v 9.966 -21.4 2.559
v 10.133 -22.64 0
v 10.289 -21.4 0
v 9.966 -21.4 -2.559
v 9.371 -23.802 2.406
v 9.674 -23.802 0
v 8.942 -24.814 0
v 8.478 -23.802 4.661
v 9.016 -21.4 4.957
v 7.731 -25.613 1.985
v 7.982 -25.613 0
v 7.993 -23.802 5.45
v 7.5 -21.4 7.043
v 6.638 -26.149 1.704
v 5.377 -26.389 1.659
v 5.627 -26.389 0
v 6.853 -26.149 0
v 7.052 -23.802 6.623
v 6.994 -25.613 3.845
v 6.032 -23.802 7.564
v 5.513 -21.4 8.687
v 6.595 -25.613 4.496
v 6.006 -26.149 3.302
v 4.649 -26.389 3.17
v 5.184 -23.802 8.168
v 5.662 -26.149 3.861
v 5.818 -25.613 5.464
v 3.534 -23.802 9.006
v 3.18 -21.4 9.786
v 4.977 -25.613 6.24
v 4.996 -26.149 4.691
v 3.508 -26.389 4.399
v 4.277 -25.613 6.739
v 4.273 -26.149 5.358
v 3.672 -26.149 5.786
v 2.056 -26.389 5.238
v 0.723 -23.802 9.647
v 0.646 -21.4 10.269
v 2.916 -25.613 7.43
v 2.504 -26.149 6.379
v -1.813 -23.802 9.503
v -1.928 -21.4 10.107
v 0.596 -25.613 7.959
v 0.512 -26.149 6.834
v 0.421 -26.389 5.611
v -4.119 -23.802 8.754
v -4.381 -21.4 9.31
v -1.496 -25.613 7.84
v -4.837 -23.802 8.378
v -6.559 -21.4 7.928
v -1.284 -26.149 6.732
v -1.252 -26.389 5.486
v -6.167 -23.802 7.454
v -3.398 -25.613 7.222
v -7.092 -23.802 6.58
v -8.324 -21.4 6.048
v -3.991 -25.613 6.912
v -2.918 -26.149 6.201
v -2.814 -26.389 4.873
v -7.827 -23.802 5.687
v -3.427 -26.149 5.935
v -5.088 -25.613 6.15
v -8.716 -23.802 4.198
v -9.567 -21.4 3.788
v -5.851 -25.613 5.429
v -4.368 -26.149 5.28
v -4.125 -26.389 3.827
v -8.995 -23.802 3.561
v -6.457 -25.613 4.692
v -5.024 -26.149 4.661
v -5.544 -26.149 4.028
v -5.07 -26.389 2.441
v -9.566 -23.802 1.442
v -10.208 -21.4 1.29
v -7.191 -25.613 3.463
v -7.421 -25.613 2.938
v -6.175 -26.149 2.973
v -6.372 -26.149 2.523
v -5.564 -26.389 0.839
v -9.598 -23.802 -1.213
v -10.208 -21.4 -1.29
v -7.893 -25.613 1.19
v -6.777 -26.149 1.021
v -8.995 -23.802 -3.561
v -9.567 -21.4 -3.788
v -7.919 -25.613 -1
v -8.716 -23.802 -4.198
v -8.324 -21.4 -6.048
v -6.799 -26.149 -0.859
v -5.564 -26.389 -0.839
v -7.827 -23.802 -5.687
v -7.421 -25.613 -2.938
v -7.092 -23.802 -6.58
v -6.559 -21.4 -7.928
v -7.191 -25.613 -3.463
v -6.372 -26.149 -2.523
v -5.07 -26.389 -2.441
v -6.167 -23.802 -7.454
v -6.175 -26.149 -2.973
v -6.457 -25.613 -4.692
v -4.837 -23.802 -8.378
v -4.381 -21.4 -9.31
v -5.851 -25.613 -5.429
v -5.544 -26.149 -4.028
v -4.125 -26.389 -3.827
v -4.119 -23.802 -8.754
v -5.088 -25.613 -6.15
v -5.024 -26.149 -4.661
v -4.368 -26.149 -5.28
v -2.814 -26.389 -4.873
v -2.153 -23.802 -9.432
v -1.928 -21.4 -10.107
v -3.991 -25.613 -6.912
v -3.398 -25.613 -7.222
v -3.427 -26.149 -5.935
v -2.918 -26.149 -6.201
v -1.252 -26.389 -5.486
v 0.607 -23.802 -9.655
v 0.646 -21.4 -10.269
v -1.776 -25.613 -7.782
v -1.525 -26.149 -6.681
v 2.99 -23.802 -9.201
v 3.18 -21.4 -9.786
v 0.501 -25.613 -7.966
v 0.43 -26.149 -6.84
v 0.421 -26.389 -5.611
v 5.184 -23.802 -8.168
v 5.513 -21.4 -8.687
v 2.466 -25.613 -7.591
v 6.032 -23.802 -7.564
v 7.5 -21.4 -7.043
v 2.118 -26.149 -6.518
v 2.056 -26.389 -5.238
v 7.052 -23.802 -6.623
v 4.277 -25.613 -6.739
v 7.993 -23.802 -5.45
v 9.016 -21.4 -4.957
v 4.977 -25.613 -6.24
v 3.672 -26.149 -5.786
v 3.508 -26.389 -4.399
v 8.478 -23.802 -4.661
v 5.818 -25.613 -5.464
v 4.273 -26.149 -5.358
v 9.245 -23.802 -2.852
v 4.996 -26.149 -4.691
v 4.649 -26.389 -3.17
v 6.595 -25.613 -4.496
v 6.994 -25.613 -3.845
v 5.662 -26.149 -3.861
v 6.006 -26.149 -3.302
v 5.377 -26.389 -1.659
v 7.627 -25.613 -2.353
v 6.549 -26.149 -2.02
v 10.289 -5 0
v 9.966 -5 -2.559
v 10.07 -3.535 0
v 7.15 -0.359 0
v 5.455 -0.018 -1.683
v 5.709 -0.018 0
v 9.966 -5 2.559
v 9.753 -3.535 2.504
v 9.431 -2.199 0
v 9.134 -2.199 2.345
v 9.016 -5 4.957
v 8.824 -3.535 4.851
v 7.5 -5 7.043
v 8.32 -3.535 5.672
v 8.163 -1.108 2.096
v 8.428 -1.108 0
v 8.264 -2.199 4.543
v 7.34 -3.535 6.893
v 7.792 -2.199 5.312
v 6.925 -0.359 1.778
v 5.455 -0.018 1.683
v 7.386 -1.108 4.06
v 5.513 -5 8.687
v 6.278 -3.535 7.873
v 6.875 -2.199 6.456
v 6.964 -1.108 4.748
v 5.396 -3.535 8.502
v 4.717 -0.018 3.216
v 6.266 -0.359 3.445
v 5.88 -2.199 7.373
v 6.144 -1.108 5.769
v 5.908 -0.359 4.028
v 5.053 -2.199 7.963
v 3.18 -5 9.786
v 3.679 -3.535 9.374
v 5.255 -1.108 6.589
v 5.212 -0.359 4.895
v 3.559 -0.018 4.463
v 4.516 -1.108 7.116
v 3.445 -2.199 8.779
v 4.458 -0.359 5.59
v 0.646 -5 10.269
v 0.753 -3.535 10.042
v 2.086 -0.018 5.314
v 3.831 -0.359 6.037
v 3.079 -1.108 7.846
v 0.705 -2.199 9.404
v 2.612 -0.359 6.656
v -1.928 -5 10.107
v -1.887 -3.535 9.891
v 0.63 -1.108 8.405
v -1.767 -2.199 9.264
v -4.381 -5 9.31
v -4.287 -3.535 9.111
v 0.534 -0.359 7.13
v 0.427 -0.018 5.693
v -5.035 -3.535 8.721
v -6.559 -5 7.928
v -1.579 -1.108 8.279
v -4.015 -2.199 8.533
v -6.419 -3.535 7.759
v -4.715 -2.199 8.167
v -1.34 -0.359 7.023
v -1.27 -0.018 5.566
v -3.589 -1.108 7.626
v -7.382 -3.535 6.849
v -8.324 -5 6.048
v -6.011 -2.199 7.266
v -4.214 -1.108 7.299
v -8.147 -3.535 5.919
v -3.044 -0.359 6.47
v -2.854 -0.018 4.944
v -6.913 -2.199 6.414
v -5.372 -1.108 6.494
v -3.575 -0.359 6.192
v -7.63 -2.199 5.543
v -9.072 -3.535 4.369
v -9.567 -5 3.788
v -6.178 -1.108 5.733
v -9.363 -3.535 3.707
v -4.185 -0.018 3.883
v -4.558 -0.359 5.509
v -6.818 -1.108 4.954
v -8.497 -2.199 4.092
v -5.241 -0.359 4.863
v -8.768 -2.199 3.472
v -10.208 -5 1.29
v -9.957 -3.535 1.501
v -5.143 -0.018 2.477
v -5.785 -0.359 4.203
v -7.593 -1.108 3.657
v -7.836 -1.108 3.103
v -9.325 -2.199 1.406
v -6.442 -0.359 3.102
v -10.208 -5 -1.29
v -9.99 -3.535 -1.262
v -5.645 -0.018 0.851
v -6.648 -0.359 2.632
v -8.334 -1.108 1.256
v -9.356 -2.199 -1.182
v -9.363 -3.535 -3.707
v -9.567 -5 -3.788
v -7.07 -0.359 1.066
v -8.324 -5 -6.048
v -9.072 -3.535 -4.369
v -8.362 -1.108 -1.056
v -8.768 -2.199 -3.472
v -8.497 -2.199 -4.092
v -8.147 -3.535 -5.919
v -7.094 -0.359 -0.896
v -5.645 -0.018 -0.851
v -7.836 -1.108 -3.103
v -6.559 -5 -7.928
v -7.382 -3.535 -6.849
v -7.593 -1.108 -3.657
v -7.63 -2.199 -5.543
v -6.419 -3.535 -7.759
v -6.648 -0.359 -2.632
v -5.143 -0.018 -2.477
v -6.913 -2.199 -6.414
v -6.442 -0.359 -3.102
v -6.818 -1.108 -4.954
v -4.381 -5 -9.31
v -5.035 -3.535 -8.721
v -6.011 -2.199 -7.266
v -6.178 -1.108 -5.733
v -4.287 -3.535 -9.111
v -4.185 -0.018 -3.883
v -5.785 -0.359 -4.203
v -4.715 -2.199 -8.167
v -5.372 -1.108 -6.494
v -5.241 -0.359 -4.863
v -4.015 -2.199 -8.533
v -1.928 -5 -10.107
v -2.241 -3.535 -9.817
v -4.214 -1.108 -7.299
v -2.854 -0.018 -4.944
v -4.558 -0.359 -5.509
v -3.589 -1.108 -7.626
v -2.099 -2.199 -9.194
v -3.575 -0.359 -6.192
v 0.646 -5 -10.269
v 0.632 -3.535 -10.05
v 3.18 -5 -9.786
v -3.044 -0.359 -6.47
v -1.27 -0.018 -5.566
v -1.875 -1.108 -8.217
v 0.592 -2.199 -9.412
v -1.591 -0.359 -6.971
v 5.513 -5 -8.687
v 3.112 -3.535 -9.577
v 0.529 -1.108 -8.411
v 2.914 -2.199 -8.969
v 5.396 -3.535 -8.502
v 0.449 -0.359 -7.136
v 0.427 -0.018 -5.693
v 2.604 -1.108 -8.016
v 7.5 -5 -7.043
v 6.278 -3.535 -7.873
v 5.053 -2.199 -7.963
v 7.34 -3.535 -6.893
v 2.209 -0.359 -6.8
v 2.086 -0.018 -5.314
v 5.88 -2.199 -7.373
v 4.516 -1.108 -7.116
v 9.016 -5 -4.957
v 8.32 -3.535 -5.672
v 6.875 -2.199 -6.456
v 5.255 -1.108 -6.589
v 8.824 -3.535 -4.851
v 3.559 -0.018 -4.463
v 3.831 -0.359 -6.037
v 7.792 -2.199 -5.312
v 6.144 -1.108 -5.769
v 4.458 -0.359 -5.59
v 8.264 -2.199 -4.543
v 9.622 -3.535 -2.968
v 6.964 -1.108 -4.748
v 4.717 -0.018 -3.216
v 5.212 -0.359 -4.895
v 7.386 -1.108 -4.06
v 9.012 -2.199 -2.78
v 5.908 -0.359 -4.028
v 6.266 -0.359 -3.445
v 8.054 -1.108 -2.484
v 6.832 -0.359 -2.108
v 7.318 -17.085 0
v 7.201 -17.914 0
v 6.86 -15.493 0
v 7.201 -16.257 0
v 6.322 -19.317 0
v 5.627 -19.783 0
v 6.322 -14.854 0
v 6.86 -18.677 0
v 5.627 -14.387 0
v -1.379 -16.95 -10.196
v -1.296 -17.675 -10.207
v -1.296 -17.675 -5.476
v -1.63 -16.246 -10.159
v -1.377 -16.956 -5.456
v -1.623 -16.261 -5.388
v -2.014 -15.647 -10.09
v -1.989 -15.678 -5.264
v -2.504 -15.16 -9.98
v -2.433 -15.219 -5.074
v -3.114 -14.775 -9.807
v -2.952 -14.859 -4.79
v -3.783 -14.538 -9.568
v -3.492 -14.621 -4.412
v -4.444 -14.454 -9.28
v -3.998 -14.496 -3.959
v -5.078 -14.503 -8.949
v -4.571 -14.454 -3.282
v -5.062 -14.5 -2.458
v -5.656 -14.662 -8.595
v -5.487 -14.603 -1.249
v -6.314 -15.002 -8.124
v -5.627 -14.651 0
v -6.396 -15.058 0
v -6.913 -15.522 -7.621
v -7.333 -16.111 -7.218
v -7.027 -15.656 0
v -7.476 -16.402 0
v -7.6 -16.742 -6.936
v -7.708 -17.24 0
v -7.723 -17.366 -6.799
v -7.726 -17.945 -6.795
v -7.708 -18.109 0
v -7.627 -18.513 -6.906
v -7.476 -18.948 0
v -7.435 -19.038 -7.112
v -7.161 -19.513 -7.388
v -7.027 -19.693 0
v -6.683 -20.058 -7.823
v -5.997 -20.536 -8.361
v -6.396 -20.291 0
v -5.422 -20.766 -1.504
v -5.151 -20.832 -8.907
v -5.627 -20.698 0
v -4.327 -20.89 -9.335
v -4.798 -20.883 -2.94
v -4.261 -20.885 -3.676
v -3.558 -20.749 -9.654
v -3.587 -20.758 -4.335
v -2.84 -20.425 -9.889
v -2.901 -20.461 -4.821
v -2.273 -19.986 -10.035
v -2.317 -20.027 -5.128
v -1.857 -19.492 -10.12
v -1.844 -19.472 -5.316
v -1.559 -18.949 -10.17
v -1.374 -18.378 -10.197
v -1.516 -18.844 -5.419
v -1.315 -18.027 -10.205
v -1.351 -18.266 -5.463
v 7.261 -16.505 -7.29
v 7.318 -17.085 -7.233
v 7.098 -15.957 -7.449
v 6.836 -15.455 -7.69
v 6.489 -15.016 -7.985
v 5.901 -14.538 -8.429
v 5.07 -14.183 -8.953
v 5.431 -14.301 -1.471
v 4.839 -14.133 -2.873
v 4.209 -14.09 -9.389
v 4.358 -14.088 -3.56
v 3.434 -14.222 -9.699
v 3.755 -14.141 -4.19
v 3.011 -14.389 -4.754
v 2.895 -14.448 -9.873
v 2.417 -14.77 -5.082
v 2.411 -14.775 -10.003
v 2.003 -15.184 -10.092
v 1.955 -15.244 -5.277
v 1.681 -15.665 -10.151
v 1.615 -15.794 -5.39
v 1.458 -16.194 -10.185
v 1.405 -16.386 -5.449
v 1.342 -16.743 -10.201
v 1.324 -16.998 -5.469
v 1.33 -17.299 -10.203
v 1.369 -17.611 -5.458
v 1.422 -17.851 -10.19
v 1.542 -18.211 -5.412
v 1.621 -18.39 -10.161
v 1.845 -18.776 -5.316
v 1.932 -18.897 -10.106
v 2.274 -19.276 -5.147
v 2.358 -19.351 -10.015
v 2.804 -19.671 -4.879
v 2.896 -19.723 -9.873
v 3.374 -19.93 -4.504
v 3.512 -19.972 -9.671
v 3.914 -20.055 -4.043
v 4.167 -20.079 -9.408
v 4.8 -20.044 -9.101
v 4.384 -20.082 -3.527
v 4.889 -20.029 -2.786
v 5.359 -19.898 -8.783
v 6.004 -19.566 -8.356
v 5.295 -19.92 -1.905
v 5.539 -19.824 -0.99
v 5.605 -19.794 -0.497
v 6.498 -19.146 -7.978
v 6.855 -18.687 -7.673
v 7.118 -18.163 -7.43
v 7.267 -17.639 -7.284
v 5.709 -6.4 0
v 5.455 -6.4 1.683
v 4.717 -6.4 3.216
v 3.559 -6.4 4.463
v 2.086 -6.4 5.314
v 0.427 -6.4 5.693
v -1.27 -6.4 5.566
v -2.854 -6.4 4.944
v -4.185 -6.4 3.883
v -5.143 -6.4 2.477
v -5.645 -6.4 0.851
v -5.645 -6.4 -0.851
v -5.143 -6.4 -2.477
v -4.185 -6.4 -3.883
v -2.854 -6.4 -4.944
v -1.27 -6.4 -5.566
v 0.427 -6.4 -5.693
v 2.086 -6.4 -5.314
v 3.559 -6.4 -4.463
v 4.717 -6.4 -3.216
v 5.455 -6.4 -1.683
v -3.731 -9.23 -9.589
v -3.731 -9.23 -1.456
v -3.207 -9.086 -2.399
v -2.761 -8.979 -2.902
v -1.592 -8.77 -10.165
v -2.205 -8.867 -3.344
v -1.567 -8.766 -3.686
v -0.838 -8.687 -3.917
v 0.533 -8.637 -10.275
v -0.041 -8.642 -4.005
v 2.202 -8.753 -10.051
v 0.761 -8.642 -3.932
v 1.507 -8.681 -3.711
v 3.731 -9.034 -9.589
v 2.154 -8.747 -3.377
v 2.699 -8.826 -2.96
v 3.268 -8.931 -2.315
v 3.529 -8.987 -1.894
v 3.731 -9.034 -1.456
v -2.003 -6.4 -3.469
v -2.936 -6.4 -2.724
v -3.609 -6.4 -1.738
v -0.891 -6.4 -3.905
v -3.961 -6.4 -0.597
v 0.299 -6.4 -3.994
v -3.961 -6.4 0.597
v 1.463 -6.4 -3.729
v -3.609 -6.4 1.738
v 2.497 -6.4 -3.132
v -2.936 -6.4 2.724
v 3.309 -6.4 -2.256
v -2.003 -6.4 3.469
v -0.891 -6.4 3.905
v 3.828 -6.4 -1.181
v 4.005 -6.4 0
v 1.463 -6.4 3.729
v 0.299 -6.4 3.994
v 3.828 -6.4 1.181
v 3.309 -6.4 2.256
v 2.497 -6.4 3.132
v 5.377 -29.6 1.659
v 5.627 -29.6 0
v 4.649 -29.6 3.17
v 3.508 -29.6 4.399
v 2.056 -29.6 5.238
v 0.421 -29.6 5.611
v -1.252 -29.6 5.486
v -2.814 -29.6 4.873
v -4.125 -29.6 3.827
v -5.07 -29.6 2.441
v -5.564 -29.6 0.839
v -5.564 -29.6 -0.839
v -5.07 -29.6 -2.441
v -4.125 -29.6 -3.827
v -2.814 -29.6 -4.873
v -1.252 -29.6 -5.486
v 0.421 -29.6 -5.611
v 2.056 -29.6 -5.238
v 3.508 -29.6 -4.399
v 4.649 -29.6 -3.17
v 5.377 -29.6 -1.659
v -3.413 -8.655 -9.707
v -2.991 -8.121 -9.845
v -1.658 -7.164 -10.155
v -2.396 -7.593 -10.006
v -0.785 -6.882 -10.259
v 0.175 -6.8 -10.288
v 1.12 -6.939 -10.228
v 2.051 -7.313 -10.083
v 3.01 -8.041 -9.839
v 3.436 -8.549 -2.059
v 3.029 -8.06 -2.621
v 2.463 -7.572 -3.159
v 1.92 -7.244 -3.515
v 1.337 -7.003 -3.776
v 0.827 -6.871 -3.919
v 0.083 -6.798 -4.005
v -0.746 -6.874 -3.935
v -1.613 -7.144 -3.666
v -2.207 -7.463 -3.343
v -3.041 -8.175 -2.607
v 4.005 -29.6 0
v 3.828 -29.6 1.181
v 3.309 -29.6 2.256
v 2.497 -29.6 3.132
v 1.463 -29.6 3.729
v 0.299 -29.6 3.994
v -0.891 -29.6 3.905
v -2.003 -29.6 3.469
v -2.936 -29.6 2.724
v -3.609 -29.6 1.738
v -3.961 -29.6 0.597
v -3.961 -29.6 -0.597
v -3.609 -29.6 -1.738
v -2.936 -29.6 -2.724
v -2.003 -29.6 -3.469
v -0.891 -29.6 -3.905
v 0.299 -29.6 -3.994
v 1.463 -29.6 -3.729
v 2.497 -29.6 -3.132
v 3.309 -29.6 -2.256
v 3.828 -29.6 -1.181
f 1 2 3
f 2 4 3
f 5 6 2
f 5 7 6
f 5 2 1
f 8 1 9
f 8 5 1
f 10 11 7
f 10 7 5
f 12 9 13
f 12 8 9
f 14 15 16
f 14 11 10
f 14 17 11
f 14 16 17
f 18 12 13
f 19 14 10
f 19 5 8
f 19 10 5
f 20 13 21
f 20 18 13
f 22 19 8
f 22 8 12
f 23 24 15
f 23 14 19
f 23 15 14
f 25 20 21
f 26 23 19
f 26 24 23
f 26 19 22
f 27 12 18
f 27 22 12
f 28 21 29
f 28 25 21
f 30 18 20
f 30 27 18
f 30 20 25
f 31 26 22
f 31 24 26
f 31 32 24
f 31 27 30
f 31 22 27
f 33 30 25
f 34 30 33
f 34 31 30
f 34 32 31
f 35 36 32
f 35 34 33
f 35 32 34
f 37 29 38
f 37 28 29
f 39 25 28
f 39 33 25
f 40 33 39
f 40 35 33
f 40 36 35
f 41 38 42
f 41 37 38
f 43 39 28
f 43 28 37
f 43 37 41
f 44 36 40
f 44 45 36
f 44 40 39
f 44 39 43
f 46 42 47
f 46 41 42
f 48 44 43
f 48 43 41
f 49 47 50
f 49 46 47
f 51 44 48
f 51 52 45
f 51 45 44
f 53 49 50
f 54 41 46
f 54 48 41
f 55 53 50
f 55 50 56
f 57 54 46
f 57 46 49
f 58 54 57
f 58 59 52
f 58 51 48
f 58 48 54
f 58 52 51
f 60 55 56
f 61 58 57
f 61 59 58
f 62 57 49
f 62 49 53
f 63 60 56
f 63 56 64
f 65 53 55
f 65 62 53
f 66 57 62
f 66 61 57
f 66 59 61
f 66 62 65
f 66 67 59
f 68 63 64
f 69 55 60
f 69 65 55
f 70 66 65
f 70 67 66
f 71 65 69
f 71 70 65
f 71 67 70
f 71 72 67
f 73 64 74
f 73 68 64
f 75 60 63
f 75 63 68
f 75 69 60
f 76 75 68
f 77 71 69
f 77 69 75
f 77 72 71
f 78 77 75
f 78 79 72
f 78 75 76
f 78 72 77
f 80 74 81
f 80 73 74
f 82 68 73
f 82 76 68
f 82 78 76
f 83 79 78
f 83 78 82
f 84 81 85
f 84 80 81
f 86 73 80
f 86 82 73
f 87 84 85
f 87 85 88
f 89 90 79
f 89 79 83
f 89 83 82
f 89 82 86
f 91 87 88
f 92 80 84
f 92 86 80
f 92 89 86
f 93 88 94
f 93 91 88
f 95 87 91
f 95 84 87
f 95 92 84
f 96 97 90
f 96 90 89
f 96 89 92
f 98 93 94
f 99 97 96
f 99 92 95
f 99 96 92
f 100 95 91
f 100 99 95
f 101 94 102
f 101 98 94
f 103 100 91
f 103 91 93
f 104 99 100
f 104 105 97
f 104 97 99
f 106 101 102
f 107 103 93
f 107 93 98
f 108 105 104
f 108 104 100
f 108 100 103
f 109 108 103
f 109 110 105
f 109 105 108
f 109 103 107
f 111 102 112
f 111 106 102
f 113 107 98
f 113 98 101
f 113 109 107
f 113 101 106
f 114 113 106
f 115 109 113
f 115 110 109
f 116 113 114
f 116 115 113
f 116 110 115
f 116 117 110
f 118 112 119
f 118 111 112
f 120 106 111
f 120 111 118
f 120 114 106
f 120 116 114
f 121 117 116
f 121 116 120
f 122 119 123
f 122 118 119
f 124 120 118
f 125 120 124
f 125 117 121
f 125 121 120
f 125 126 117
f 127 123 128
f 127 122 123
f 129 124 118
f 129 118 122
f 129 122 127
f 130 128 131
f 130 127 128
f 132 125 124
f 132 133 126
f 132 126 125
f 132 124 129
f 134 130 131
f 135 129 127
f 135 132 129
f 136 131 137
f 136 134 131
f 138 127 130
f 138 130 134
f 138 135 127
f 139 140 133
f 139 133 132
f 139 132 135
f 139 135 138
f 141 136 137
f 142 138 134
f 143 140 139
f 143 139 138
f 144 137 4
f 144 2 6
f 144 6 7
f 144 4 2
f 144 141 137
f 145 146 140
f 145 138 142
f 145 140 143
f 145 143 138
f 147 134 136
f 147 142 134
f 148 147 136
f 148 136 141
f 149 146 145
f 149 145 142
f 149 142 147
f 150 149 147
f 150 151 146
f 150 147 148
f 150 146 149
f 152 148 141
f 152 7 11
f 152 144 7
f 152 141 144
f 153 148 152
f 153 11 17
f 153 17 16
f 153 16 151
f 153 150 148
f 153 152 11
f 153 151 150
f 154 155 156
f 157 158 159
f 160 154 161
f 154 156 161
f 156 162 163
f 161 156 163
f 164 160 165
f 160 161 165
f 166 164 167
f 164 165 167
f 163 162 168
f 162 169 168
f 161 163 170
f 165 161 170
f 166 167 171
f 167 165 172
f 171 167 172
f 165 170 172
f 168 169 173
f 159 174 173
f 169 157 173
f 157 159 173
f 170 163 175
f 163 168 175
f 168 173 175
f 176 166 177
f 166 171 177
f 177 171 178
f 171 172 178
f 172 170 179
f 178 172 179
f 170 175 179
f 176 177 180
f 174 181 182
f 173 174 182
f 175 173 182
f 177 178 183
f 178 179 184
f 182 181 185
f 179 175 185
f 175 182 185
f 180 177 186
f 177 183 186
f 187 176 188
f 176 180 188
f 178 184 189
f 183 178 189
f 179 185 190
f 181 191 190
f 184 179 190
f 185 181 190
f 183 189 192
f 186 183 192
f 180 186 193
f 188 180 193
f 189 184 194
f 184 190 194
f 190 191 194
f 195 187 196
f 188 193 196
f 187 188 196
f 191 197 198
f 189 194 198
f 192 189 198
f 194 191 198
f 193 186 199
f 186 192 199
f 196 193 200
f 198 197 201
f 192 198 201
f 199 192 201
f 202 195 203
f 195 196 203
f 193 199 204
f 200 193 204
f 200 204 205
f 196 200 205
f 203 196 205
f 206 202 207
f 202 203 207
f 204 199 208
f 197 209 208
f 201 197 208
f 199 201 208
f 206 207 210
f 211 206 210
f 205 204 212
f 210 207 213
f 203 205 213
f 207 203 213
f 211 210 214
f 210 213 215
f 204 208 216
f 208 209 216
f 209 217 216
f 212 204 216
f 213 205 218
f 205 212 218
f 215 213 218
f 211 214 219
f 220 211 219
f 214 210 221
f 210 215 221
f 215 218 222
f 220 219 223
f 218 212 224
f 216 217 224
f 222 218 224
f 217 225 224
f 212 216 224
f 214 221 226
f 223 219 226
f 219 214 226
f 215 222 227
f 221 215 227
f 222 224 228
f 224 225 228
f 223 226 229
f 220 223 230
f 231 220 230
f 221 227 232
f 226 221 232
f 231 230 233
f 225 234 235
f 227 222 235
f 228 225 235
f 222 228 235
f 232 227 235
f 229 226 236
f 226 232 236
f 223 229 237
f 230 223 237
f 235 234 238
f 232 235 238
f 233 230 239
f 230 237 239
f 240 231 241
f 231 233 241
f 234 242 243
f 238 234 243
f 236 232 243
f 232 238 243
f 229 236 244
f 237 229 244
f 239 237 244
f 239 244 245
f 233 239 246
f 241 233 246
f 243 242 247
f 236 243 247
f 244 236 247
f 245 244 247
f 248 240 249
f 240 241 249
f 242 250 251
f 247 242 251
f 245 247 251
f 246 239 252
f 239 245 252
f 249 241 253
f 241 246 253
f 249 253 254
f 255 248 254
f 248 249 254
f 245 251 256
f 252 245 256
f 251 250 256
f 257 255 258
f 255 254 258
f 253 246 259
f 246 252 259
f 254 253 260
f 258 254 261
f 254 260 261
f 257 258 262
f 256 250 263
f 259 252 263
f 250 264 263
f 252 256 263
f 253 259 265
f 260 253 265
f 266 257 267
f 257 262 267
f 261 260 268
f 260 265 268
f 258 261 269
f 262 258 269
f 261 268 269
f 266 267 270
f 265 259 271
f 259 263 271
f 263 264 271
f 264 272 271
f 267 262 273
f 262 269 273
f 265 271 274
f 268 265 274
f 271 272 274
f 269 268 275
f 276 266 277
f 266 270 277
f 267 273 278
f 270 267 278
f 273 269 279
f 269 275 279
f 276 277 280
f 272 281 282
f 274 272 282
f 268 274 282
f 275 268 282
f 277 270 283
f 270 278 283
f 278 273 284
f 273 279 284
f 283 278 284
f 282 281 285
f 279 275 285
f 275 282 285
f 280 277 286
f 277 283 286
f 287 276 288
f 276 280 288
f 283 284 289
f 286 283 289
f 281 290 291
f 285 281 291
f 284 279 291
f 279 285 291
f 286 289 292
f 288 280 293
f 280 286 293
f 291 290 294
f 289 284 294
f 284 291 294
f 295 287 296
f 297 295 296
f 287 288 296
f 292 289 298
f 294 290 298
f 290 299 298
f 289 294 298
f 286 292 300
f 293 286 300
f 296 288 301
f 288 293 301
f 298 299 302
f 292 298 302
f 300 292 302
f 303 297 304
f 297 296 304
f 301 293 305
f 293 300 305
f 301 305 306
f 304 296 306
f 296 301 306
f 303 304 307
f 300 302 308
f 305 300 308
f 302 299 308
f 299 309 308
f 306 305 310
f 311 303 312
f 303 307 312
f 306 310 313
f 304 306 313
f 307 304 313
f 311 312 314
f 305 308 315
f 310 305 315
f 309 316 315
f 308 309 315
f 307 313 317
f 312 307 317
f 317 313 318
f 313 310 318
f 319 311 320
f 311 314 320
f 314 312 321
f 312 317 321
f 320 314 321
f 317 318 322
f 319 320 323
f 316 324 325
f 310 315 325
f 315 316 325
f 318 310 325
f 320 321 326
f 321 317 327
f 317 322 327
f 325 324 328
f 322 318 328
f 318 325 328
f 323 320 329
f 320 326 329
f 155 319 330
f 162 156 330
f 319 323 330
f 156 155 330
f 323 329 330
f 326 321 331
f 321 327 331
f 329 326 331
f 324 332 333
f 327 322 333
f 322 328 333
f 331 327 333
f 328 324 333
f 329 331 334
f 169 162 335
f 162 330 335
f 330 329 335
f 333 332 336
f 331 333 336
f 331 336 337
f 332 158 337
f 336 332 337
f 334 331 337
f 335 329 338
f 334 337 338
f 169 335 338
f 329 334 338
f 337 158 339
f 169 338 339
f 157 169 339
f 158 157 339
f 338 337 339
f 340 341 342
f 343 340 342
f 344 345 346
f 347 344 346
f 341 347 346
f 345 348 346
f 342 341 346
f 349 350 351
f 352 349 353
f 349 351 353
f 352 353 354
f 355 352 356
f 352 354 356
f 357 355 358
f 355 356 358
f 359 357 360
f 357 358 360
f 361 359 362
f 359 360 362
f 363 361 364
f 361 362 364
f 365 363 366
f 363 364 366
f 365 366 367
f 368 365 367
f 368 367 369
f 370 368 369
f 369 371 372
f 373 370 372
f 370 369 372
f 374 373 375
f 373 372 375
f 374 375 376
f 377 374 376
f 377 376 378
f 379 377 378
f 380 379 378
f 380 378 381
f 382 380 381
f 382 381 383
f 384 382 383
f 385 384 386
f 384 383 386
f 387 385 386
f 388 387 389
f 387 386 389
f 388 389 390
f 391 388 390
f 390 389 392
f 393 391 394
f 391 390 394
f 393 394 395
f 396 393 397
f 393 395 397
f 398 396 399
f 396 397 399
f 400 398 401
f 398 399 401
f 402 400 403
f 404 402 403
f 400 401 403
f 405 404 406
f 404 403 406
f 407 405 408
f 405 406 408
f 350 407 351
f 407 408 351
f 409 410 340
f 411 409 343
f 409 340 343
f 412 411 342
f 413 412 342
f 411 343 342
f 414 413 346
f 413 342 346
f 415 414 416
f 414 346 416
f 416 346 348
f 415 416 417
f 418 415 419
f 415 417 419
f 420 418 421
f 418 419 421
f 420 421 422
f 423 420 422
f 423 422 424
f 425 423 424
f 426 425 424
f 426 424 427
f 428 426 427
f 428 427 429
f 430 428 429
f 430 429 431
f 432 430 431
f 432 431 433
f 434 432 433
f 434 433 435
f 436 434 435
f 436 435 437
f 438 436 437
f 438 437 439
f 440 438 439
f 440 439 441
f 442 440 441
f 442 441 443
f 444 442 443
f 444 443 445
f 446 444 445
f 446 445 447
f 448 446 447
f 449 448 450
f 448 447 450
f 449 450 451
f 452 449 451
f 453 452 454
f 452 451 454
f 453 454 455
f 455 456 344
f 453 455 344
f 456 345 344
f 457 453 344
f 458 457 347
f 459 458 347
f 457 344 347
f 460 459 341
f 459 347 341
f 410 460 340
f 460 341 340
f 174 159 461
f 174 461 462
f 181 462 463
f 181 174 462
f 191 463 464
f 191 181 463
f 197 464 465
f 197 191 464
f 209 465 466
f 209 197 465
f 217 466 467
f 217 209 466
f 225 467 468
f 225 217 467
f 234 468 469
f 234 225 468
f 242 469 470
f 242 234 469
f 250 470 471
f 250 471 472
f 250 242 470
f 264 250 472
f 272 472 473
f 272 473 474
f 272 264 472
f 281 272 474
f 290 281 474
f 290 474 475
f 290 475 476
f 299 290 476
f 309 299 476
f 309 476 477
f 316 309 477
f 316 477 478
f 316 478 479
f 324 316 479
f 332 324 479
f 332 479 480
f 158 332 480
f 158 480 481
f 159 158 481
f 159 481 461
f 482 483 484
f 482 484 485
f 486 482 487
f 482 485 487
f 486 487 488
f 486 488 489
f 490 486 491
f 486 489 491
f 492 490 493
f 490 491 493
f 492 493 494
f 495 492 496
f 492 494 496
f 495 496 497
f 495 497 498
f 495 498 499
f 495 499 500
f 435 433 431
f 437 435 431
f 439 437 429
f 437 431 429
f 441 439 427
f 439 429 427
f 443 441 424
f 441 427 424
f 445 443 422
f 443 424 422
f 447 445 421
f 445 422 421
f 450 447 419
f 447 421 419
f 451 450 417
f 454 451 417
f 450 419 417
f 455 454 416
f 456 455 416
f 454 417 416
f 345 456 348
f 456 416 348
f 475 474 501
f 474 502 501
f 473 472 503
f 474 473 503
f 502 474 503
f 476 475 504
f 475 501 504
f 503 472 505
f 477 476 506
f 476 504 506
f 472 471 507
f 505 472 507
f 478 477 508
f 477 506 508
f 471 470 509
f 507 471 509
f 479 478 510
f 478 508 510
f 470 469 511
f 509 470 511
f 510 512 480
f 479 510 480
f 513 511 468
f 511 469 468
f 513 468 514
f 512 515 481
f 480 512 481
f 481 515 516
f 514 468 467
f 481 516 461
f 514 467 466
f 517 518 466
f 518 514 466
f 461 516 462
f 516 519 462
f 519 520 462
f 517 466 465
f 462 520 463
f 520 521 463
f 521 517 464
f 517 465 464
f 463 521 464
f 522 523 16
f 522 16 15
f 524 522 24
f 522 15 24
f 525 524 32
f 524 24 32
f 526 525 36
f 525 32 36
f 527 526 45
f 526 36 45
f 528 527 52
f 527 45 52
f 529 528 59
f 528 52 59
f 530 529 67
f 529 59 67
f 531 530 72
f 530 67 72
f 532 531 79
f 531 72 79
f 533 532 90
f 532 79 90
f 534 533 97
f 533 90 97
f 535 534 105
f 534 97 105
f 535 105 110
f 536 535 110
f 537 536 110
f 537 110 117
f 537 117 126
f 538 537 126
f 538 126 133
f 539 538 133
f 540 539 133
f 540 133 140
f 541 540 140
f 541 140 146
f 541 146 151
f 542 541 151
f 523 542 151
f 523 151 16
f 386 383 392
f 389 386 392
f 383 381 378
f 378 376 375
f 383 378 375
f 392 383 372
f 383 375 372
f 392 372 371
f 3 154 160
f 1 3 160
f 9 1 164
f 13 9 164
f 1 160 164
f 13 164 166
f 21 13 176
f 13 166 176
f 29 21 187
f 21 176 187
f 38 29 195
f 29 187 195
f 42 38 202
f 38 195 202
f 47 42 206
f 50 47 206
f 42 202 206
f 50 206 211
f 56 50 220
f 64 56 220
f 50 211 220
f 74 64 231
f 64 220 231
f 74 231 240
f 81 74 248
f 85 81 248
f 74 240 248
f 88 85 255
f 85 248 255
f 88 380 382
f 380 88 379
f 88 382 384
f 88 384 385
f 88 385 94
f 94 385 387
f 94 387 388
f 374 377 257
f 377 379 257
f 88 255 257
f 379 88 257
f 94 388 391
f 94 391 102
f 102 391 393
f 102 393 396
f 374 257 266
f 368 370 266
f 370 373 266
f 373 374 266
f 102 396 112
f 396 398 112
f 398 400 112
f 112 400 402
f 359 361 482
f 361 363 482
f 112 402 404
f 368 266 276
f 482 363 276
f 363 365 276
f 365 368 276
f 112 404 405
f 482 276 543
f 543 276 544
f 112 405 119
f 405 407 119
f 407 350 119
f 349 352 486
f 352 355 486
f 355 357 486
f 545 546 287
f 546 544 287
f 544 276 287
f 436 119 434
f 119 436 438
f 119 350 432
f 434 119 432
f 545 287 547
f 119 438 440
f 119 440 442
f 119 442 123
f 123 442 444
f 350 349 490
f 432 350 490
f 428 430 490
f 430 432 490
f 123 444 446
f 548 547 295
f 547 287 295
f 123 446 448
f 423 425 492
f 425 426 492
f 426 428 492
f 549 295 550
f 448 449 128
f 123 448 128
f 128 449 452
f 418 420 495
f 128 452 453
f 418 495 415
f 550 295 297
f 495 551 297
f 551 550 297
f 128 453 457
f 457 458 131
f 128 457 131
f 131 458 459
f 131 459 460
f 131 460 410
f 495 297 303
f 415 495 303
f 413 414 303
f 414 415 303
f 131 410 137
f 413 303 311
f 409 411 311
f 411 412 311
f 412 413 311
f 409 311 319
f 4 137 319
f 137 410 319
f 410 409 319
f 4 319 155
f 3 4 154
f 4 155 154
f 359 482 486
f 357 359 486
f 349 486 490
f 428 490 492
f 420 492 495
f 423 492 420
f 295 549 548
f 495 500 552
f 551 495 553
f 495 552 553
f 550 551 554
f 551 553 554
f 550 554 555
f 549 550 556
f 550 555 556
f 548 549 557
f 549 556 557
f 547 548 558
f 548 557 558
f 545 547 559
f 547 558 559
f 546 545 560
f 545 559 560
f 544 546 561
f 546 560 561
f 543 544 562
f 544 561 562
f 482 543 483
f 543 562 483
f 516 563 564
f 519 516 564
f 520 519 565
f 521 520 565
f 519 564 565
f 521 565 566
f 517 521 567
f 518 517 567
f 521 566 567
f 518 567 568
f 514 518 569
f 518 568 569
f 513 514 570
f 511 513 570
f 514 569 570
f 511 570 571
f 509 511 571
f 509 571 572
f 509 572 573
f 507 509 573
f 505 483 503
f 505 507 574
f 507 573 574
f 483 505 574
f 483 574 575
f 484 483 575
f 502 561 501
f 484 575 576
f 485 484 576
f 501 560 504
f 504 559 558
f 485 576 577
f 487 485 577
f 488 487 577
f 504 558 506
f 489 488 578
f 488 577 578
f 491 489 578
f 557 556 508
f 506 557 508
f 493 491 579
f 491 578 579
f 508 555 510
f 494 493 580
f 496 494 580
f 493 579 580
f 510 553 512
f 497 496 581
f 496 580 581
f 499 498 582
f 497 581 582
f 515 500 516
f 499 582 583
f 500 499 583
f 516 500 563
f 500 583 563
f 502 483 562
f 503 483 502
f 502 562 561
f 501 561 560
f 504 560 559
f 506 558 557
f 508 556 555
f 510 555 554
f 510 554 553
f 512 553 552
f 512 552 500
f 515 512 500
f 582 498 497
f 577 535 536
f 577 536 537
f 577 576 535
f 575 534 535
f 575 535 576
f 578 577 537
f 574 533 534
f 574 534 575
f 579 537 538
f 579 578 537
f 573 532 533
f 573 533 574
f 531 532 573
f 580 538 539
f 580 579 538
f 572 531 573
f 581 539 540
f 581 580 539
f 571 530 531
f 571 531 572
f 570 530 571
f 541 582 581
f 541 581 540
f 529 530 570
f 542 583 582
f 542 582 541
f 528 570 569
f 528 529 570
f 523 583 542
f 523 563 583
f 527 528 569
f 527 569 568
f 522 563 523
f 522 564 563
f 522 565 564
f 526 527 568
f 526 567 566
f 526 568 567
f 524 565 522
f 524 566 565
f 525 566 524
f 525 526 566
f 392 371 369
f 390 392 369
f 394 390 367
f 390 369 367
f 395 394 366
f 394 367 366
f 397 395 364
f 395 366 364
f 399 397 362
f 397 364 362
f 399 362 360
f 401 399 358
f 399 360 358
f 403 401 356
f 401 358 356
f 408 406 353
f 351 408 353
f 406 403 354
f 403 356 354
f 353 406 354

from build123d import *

# Parameters (mm, degrees)
F0_R      = 10.289099
F2_DEPTH  = 26.4
F4_R      = 5
F5_R      = 5.460042
F3_R      = 5.477672
F6_DEPTH  = 10.3
F7_R      = 2.997671
F8_DEPTH  = 15.6
F9_R      = 3.220939
F10_DEPTH = 25
F11_R     = 5.627011
F12_DEPTH = 29.6
F13_R     = 5.708665
F14_DEPTH = 6.4
F15_R     = 4.005465
F16_DEPTH = 46.1
F18_DEPTH = 44.9


with BuildPart() as f2:
    # F0 (on Front) → F2 (new body)
    with BuildSketch(Plane.XZ):
        Circle(F0_R)
    extrude(amount=F2_DEPTH)

    # F4
    f4_edges = [f2.edges().sort_by_distance(p)[0] for p in [
        (-10.289099, -26.4, 0),
        (-10.289099, 0, 0),
    ]]
    fillet(f4_edges, radius=F4_R)

    # F5 (on Front) + F3 (on Front) → F6 (cut)
    with BuildSketch(Plane.XZ):
        Circle(F5_R)
    with BuildSketch(Plane.XZ):
        Circle(F3_R)
    extrude(amount=F6_DEPTH, mode=Mode.SUBTRACT)

    # F7 (on Top) → F8 (cut)
    with BuildSketch(Plane.XY):
        with Locations((4.320451, -17.085413)):
            Circle(F7_R)
    extrude(amount=-F8_DEPTH, mode=Mode.SUBTRACT)

    # F9 (on Top) → F10 (cut)
    with BuildSketch(Plane.XY):
        with Locations((-4.516833, -17.674565)):
            Circle(F9_R)
    extrude(amount=-F10_DEPTH, mode=Mode.SUBTRACT)

    # F11 (on Front) → F12 (join)
    with BuildSketch(Plane.XZ):
        Circle(F11_R)
    extrude(amount=F12_DEPTH)

    # F13 (on Front) → F14 (cut)
    with BuildSketch(Plane.XZ):
        Circle(F13_R)
    extrude(amount=F14_DEPTH, mode=Mode.SUBTRACT)

    # F15 (on Front) → F16 (cut, symmetric)
    with BuildSketch(Plane.XZ):
        Circle(F15_R)
    extrude(amount=F16_DEPTH, both=True, mode=Mode.SUBTRACT)

    # F17 (on Top) → F18 (cut)
    with BuildSketch(Plane.XY):
        with BuildLine():
            ThreePointArc((-3.731297, -9.23005), (-0.012911, -8.641232), (3.731297, -9.033666))
            ThreePointArc((3.731297, -9.033666), (-0.061388, -6.799126), (-3.731297, -9.23005))
        make_face()
    extrude(amount=-F18_DEPTH, mode=Mode.SUBTRACT)


solid = f2.part
